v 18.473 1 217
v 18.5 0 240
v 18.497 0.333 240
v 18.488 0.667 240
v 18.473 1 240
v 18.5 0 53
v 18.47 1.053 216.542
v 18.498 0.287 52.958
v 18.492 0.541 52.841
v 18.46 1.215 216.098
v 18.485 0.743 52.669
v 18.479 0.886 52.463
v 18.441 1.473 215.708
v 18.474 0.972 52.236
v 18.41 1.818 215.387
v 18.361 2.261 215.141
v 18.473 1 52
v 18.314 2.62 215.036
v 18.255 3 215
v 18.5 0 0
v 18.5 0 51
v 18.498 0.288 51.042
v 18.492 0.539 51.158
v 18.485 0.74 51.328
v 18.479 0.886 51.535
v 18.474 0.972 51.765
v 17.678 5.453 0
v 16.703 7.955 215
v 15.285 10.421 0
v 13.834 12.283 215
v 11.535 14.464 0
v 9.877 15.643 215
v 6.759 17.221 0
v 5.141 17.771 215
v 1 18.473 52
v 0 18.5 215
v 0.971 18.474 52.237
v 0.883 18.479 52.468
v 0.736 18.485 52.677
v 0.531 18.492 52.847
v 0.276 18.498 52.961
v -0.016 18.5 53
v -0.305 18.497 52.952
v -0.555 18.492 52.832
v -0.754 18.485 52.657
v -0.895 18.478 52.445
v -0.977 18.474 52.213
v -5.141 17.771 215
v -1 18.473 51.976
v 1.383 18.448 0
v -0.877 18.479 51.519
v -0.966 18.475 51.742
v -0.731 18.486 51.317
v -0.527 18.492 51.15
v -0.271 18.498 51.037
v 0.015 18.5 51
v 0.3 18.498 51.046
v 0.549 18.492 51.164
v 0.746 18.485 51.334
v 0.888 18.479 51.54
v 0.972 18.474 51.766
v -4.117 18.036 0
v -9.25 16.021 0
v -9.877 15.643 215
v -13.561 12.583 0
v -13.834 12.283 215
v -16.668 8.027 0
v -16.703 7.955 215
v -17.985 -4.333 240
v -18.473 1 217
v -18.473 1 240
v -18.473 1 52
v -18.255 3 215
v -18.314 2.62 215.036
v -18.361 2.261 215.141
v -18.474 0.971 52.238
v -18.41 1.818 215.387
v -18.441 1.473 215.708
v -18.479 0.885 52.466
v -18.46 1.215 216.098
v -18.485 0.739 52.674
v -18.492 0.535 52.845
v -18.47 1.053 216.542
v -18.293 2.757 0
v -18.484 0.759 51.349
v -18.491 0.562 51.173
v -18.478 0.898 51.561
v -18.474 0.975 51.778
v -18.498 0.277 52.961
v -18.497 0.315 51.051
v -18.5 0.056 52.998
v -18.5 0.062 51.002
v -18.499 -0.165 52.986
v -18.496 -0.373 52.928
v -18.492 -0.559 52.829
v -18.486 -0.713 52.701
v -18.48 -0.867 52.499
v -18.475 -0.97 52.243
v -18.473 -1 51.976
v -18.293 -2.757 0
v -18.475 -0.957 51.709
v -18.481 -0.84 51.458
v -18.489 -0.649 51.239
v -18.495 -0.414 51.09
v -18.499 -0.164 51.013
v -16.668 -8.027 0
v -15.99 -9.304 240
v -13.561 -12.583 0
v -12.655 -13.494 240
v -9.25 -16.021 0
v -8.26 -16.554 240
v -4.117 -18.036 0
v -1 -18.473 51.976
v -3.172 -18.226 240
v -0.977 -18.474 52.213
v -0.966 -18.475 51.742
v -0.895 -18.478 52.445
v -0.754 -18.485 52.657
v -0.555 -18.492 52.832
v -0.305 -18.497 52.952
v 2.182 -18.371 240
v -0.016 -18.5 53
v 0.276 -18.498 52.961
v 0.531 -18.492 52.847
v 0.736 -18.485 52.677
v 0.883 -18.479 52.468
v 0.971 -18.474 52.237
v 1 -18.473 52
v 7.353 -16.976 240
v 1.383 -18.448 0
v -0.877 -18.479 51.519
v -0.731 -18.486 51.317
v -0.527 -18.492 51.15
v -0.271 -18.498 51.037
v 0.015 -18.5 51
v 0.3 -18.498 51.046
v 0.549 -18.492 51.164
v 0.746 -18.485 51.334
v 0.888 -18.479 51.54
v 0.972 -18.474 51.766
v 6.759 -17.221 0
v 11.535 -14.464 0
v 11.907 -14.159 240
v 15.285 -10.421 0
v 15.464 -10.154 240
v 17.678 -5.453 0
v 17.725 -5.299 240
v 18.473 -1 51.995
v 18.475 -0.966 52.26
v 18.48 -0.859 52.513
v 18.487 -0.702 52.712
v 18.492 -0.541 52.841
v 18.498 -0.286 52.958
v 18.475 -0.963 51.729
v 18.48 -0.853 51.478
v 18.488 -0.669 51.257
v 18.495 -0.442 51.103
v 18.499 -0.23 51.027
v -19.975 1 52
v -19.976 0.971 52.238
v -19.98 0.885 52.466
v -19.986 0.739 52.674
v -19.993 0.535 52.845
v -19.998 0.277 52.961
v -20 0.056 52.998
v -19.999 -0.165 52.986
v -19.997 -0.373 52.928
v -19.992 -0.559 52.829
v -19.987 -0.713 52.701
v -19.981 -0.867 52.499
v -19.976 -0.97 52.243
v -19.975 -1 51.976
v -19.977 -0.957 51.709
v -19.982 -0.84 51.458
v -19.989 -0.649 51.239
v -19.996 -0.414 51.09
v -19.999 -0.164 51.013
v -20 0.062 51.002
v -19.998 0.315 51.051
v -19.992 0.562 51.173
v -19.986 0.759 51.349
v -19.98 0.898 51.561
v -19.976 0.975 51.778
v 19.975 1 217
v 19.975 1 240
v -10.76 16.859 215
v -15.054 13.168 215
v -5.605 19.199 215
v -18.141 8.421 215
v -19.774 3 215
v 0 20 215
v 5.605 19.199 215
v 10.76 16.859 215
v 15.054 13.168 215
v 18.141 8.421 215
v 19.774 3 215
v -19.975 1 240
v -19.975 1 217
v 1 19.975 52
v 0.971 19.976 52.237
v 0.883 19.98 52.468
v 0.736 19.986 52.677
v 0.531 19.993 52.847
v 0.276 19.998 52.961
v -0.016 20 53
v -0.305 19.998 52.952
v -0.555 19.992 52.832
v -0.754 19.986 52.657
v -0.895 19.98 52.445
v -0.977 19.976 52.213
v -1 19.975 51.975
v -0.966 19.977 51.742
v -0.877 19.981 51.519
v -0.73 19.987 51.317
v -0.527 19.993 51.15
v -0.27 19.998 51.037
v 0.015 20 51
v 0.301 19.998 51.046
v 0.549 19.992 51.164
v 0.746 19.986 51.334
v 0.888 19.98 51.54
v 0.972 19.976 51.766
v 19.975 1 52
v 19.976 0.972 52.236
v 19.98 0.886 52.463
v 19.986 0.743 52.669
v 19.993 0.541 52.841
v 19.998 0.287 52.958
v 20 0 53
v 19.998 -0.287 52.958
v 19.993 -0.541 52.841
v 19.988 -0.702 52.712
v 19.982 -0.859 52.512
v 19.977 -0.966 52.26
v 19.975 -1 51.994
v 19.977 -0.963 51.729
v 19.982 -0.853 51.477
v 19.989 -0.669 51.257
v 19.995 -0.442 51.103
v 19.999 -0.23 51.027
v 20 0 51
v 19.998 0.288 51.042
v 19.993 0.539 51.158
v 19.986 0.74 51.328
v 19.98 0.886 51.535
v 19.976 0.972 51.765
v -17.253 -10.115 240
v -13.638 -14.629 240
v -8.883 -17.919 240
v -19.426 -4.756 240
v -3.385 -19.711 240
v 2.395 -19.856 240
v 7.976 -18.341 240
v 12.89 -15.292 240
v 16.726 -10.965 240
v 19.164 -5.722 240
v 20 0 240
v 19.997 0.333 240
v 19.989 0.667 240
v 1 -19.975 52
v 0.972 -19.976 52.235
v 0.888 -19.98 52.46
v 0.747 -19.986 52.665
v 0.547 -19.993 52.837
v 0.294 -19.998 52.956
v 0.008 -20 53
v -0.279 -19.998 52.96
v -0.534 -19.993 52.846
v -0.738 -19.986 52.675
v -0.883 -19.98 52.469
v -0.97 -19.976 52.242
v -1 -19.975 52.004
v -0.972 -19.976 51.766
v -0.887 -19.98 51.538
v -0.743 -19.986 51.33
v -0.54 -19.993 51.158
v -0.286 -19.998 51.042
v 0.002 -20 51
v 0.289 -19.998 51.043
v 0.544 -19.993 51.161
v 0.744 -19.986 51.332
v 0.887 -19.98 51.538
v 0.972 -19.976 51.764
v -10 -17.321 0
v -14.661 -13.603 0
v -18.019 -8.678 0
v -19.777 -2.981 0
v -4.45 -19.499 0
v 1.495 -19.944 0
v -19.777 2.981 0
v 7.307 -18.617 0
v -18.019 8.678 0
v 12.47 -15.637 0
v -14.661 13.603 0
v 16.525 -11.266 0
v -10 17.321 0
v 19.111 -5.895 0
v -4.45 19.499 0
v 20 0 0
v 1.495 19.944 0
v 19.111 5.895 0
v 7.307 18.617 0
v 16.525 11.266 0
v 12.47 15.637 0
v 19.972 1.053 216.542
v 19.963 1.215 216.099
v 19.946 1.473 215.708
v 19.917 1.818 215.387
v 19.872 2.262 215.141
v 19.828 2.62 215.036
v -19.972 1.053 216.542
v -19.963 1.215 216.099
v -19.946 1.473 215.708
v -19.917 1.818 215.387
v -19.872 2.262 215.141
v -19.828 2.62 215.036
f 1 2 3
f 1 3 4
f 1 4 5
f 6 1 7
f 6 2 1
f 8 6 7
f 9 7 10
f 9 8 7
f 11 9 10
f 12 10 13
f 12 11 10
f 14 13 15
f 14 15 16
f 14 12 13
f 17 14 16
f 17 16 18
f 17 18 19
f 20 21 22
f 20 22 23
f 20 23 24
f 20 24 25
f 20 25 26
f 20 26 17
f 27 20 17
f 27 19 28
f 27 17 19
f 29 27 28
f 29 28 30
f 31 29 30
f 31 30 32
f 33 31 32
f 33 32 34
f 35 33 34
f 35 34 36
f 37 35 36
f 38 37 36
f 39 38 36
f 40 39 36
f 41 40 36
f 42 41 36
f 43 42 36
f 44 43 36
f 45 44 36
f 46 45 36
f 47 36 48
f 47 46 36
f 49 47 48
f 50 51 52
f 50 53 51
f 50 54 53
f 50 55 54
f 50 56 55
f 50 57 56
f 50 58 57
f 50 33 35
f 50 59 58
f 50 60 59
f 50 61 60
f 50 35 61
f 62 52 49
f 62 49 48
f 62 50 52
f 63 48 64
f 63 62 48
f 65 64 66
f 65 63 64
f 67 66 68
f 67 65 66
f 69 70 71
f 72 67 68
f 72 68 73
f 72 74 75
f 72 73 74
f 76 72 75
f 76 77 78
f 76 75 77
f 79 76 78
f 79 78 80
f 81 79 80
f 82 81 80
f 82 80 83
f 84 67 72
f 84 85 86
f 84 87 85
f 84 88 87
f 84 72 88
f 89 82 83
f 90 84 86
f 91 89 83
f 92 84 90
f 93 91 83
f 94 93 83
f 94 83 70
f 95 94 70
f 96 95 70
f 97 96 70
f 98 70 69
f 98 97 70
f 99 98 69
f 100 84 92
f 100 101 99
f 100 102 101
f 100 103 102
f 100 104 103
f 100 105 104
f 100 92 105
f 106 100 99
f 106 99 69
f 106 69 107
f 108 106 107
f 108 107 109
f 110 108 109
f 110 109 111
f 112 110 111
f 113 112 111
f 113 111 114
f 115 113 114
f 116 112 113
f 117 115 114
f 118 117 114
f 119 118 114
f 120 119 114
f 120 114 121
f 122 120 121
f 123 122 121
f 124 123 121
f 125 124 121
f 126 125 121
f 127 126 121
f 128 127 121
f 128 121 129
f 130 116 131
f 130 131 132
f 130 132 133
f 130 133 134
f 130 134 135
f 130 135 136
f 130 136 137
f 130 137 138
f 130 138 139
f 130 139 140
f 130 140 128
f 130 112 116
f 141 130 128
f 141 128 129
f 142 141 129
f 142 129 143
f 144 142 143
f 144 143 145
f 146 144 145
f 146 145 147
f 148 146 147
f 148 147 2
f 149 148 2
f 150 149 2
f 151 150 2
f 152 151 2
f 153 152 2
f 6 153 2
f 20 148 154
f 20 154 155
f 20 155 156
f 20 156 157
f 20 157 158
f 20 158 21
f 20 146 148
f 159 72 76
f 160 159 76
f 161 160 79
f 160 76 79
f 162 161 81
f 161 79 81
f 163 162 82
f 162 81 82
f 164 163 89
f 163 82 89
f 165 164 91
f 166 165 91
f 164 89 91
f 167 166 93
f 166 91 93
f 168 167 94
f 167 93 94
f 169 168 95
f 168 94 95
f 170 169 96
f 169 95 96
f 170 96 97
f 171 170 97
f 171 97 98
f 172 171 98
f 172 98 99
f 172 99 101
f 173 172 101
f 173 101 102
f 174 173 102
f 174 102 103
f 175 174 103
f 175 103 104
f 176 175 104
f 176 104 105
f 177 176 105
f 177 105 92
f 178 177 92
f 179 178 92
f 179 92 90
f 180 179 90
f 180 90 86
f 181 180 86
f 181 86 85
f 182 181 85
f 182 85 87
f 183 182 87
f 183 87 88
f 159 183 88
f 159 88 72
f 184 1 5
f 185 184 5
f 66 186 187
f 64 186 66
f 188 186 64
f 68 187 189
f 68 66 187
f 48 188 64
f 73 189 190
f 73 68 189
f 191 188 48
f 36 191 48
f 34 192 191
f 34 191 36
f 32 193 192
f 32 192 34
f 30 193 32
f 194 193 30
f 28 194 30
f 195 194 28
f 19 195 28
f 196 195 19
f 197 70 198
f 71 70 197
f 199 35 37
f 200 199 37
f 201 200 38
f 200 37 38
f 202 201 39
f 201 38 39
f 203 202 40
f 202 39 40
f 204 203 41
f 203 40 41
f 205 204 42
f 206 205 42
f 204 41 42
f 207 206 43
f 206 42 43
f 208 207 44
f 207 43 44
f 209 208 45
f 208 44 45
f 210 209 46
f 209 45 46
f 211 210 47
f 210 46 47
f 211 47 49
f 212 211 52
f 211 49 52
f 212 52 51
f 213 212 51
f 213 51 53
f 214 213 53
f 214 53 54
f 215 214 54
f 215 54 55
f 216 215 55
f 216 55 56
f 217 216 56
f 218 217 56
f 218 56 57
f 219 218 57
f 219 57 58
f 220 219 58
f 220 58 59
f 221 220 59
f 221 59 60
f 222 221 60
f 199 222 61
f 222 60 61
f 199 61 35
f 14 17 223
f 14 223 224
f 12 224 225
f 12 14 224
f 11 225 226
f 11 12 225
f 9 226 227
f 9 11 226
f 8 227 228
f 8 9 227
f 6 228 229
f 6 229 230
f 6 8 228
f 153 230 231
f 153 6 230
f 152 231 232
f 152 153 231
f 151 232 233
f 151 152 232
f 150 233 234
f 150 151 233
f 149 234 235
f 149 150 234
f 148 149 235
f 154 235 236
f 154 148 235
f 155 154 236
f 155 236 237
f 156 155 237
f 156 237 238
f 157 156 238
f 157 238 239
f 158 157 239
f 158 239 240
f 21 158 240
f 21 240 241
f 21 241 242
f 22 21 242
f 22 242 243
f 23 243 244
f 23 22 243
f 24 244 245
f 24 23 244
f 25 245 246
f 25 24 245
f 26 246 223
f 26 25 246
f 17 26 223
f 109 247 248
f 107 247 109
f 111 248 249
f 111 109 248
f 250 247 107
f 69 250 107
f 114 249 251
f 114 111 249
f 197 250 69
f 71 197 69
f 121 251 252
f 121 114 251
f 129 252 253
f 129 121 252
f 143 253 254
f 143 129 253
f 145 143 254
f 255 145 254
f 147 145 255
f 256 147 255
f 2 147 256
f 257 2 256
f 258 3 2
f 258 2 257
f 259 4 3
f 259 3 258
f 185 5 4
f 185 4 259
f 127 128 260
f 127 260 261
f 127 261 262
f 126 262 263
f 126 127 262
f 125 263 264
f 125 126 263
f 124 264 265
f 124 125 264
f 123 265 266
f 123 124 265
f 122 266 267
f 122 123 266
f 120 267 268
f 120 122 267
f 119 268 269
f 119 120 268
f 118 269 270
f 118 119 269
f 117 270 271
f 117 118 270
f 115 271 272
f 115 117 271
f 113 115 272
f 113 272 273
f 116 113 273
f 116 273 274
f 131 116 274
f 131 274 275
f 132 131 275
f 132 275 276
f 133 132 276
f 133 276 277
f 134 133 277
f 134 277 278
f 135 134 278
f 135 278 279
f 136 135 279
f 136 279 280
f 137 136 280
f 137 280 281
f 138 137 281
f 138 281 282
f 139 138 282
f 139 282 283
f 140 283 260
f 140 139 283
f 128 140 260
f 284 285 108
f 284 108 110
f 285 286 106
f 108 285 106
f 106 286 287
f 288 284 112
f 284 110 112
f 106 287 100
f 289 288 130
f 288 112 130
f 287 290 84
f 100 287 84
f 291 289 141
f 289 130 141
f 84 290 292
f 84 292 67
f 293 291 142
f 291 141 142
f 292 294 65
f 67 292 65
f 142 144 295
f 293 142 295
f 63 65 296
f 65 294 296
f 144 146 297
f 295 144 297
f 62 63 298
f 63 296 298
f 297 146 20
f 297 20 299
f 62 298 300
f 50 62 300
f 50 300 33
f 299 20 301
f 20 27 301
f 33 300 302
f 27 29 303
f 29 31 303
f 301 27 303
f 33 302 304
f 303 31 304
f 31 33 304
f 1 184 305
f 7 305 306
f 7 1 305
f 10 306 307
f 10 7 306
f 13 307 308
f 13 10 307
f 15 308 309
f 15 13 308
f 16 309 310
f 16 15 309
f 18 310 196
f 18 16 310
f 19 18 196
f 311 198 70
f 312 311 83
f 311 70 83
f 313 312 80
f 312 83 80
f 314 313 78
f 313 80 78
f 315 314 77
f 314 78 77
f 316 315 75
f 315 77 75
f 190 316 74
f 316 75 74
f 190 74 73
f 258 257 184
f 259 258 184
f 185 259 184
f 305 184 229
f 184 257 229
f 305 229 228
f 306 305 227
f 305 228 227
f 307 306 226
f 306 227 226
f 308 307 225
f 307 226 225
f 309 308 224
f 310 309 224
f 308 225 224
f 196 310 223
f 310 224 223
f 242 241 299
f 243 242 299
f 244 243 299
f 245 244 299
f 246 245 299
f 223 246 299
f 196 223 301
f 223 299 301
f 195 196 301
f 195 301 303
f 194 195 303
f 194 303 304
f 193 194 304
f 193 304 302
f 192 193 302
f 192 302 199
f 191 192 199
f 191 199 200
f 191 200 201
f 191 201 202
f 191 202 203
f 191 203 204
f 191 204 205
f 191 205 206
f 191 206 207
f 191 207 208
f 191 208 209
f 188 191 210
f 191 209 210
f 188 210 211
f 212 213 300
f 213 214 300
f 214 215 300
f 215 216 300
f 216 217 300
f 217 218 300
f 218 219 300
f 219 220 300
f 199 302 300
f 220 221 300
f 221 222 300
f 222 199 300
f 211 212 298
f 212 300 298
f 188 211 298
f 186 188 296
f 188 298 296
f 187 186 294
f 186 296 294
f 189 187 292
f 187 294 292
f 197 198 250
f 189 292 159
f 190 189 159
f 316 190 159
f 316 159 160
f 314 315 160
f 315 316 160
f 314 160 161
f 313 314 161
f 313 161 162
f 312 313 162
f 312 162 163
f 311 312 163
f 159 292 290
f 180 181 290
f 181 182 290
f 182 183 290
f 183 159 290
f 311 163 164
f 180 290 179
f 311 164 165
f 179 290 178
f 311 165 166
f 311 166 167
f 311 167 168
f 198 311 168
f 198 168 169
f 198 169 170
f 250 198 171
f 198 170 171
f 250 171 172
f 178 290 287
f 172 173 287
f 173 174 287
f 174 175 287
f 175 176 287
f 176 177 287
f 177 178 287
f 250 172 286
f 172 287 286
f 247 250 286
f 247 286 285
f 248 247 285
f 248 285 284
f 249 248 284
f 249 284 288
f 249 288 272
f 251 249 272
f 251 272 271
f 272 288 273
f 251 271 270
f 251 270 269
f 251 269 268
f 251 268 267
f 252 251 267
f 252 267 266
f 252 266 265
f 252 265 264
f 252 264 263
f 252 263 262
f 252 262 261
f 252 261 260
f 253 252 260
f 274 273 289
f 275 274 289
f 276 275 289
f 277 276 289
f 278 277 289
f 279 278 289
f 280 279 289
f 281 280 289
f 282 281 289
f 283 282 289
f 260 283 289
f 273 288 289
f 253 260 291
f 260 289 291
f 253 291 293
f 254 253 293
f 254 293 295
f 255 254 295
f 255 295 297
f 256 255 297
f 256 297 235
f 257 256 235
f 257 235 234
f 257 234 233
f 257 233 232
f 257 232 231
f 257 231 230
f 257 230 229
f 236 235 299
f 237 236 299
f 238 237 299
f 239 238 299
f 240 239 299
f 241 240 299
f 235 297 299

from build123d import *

# Parameters (mm, degrees)
SKETCH_R             = 20
SKETCH_R_2           = 18.5
PAD_DEPTH            = 240
SKETCH001_R          = 1
POCKET_DEPTH         = 20.001
POCKET_DEPTH_BACK    = -20.001
SKETCH002_R          = 1
POCKET001_DEPTH      = 20.001
POCKET001_DEPTH_BACK = -20.001


with BuildPart() as part:
    # Sketch → Pad (new body)
    with BuildSketch(Plane.XY):
        Circle(SKETCH_R)
        Circle(SKETCH_R_2, mode=Mode.SUBTRACT)
    extrude(amount=PAD_DEPTH)

    # Sketch001 → Pocket (cut, two sides)
    with BuildSketch(Plane.YZ) as pocket_sk:
        with Locations((0, 52)):
            Circle(SKETCH001_R)
        with BuildLine():
            Line((1, 240), (23, 240))
            Line((23, 240), (23, 215))
            Line((23, 215), (3, 215))
            ThreePointArc((1, 217), (1.585786, 215.585786), (3, 215))
            Line((1, 217), (1, 240))
        make_face()
    extrude(amount=-POCKET_DEPTH, mode=Mode.SUBTRACT)
    extrude(pocket_sk.sketch, amount=-POCKET_DEPTH_BACK, mode=Mode.SUBTRACT)

    # Sketch002 → Pocket001 (cut, two sides)
    with BuildSketch(Plane.XZ) as pocket001_sk:
        with Locations((0, 52)):
            Circle(SKETCH002_R)
    extrude(amount=-POCKET001_DEPTH, mode=Mode.SUBTRACT)
    extrude(pocket001_sk.sketch, amount=-POCKET001_DEPTH_BACK, mode=Mode.SUBTRACT)


solid = part.part
